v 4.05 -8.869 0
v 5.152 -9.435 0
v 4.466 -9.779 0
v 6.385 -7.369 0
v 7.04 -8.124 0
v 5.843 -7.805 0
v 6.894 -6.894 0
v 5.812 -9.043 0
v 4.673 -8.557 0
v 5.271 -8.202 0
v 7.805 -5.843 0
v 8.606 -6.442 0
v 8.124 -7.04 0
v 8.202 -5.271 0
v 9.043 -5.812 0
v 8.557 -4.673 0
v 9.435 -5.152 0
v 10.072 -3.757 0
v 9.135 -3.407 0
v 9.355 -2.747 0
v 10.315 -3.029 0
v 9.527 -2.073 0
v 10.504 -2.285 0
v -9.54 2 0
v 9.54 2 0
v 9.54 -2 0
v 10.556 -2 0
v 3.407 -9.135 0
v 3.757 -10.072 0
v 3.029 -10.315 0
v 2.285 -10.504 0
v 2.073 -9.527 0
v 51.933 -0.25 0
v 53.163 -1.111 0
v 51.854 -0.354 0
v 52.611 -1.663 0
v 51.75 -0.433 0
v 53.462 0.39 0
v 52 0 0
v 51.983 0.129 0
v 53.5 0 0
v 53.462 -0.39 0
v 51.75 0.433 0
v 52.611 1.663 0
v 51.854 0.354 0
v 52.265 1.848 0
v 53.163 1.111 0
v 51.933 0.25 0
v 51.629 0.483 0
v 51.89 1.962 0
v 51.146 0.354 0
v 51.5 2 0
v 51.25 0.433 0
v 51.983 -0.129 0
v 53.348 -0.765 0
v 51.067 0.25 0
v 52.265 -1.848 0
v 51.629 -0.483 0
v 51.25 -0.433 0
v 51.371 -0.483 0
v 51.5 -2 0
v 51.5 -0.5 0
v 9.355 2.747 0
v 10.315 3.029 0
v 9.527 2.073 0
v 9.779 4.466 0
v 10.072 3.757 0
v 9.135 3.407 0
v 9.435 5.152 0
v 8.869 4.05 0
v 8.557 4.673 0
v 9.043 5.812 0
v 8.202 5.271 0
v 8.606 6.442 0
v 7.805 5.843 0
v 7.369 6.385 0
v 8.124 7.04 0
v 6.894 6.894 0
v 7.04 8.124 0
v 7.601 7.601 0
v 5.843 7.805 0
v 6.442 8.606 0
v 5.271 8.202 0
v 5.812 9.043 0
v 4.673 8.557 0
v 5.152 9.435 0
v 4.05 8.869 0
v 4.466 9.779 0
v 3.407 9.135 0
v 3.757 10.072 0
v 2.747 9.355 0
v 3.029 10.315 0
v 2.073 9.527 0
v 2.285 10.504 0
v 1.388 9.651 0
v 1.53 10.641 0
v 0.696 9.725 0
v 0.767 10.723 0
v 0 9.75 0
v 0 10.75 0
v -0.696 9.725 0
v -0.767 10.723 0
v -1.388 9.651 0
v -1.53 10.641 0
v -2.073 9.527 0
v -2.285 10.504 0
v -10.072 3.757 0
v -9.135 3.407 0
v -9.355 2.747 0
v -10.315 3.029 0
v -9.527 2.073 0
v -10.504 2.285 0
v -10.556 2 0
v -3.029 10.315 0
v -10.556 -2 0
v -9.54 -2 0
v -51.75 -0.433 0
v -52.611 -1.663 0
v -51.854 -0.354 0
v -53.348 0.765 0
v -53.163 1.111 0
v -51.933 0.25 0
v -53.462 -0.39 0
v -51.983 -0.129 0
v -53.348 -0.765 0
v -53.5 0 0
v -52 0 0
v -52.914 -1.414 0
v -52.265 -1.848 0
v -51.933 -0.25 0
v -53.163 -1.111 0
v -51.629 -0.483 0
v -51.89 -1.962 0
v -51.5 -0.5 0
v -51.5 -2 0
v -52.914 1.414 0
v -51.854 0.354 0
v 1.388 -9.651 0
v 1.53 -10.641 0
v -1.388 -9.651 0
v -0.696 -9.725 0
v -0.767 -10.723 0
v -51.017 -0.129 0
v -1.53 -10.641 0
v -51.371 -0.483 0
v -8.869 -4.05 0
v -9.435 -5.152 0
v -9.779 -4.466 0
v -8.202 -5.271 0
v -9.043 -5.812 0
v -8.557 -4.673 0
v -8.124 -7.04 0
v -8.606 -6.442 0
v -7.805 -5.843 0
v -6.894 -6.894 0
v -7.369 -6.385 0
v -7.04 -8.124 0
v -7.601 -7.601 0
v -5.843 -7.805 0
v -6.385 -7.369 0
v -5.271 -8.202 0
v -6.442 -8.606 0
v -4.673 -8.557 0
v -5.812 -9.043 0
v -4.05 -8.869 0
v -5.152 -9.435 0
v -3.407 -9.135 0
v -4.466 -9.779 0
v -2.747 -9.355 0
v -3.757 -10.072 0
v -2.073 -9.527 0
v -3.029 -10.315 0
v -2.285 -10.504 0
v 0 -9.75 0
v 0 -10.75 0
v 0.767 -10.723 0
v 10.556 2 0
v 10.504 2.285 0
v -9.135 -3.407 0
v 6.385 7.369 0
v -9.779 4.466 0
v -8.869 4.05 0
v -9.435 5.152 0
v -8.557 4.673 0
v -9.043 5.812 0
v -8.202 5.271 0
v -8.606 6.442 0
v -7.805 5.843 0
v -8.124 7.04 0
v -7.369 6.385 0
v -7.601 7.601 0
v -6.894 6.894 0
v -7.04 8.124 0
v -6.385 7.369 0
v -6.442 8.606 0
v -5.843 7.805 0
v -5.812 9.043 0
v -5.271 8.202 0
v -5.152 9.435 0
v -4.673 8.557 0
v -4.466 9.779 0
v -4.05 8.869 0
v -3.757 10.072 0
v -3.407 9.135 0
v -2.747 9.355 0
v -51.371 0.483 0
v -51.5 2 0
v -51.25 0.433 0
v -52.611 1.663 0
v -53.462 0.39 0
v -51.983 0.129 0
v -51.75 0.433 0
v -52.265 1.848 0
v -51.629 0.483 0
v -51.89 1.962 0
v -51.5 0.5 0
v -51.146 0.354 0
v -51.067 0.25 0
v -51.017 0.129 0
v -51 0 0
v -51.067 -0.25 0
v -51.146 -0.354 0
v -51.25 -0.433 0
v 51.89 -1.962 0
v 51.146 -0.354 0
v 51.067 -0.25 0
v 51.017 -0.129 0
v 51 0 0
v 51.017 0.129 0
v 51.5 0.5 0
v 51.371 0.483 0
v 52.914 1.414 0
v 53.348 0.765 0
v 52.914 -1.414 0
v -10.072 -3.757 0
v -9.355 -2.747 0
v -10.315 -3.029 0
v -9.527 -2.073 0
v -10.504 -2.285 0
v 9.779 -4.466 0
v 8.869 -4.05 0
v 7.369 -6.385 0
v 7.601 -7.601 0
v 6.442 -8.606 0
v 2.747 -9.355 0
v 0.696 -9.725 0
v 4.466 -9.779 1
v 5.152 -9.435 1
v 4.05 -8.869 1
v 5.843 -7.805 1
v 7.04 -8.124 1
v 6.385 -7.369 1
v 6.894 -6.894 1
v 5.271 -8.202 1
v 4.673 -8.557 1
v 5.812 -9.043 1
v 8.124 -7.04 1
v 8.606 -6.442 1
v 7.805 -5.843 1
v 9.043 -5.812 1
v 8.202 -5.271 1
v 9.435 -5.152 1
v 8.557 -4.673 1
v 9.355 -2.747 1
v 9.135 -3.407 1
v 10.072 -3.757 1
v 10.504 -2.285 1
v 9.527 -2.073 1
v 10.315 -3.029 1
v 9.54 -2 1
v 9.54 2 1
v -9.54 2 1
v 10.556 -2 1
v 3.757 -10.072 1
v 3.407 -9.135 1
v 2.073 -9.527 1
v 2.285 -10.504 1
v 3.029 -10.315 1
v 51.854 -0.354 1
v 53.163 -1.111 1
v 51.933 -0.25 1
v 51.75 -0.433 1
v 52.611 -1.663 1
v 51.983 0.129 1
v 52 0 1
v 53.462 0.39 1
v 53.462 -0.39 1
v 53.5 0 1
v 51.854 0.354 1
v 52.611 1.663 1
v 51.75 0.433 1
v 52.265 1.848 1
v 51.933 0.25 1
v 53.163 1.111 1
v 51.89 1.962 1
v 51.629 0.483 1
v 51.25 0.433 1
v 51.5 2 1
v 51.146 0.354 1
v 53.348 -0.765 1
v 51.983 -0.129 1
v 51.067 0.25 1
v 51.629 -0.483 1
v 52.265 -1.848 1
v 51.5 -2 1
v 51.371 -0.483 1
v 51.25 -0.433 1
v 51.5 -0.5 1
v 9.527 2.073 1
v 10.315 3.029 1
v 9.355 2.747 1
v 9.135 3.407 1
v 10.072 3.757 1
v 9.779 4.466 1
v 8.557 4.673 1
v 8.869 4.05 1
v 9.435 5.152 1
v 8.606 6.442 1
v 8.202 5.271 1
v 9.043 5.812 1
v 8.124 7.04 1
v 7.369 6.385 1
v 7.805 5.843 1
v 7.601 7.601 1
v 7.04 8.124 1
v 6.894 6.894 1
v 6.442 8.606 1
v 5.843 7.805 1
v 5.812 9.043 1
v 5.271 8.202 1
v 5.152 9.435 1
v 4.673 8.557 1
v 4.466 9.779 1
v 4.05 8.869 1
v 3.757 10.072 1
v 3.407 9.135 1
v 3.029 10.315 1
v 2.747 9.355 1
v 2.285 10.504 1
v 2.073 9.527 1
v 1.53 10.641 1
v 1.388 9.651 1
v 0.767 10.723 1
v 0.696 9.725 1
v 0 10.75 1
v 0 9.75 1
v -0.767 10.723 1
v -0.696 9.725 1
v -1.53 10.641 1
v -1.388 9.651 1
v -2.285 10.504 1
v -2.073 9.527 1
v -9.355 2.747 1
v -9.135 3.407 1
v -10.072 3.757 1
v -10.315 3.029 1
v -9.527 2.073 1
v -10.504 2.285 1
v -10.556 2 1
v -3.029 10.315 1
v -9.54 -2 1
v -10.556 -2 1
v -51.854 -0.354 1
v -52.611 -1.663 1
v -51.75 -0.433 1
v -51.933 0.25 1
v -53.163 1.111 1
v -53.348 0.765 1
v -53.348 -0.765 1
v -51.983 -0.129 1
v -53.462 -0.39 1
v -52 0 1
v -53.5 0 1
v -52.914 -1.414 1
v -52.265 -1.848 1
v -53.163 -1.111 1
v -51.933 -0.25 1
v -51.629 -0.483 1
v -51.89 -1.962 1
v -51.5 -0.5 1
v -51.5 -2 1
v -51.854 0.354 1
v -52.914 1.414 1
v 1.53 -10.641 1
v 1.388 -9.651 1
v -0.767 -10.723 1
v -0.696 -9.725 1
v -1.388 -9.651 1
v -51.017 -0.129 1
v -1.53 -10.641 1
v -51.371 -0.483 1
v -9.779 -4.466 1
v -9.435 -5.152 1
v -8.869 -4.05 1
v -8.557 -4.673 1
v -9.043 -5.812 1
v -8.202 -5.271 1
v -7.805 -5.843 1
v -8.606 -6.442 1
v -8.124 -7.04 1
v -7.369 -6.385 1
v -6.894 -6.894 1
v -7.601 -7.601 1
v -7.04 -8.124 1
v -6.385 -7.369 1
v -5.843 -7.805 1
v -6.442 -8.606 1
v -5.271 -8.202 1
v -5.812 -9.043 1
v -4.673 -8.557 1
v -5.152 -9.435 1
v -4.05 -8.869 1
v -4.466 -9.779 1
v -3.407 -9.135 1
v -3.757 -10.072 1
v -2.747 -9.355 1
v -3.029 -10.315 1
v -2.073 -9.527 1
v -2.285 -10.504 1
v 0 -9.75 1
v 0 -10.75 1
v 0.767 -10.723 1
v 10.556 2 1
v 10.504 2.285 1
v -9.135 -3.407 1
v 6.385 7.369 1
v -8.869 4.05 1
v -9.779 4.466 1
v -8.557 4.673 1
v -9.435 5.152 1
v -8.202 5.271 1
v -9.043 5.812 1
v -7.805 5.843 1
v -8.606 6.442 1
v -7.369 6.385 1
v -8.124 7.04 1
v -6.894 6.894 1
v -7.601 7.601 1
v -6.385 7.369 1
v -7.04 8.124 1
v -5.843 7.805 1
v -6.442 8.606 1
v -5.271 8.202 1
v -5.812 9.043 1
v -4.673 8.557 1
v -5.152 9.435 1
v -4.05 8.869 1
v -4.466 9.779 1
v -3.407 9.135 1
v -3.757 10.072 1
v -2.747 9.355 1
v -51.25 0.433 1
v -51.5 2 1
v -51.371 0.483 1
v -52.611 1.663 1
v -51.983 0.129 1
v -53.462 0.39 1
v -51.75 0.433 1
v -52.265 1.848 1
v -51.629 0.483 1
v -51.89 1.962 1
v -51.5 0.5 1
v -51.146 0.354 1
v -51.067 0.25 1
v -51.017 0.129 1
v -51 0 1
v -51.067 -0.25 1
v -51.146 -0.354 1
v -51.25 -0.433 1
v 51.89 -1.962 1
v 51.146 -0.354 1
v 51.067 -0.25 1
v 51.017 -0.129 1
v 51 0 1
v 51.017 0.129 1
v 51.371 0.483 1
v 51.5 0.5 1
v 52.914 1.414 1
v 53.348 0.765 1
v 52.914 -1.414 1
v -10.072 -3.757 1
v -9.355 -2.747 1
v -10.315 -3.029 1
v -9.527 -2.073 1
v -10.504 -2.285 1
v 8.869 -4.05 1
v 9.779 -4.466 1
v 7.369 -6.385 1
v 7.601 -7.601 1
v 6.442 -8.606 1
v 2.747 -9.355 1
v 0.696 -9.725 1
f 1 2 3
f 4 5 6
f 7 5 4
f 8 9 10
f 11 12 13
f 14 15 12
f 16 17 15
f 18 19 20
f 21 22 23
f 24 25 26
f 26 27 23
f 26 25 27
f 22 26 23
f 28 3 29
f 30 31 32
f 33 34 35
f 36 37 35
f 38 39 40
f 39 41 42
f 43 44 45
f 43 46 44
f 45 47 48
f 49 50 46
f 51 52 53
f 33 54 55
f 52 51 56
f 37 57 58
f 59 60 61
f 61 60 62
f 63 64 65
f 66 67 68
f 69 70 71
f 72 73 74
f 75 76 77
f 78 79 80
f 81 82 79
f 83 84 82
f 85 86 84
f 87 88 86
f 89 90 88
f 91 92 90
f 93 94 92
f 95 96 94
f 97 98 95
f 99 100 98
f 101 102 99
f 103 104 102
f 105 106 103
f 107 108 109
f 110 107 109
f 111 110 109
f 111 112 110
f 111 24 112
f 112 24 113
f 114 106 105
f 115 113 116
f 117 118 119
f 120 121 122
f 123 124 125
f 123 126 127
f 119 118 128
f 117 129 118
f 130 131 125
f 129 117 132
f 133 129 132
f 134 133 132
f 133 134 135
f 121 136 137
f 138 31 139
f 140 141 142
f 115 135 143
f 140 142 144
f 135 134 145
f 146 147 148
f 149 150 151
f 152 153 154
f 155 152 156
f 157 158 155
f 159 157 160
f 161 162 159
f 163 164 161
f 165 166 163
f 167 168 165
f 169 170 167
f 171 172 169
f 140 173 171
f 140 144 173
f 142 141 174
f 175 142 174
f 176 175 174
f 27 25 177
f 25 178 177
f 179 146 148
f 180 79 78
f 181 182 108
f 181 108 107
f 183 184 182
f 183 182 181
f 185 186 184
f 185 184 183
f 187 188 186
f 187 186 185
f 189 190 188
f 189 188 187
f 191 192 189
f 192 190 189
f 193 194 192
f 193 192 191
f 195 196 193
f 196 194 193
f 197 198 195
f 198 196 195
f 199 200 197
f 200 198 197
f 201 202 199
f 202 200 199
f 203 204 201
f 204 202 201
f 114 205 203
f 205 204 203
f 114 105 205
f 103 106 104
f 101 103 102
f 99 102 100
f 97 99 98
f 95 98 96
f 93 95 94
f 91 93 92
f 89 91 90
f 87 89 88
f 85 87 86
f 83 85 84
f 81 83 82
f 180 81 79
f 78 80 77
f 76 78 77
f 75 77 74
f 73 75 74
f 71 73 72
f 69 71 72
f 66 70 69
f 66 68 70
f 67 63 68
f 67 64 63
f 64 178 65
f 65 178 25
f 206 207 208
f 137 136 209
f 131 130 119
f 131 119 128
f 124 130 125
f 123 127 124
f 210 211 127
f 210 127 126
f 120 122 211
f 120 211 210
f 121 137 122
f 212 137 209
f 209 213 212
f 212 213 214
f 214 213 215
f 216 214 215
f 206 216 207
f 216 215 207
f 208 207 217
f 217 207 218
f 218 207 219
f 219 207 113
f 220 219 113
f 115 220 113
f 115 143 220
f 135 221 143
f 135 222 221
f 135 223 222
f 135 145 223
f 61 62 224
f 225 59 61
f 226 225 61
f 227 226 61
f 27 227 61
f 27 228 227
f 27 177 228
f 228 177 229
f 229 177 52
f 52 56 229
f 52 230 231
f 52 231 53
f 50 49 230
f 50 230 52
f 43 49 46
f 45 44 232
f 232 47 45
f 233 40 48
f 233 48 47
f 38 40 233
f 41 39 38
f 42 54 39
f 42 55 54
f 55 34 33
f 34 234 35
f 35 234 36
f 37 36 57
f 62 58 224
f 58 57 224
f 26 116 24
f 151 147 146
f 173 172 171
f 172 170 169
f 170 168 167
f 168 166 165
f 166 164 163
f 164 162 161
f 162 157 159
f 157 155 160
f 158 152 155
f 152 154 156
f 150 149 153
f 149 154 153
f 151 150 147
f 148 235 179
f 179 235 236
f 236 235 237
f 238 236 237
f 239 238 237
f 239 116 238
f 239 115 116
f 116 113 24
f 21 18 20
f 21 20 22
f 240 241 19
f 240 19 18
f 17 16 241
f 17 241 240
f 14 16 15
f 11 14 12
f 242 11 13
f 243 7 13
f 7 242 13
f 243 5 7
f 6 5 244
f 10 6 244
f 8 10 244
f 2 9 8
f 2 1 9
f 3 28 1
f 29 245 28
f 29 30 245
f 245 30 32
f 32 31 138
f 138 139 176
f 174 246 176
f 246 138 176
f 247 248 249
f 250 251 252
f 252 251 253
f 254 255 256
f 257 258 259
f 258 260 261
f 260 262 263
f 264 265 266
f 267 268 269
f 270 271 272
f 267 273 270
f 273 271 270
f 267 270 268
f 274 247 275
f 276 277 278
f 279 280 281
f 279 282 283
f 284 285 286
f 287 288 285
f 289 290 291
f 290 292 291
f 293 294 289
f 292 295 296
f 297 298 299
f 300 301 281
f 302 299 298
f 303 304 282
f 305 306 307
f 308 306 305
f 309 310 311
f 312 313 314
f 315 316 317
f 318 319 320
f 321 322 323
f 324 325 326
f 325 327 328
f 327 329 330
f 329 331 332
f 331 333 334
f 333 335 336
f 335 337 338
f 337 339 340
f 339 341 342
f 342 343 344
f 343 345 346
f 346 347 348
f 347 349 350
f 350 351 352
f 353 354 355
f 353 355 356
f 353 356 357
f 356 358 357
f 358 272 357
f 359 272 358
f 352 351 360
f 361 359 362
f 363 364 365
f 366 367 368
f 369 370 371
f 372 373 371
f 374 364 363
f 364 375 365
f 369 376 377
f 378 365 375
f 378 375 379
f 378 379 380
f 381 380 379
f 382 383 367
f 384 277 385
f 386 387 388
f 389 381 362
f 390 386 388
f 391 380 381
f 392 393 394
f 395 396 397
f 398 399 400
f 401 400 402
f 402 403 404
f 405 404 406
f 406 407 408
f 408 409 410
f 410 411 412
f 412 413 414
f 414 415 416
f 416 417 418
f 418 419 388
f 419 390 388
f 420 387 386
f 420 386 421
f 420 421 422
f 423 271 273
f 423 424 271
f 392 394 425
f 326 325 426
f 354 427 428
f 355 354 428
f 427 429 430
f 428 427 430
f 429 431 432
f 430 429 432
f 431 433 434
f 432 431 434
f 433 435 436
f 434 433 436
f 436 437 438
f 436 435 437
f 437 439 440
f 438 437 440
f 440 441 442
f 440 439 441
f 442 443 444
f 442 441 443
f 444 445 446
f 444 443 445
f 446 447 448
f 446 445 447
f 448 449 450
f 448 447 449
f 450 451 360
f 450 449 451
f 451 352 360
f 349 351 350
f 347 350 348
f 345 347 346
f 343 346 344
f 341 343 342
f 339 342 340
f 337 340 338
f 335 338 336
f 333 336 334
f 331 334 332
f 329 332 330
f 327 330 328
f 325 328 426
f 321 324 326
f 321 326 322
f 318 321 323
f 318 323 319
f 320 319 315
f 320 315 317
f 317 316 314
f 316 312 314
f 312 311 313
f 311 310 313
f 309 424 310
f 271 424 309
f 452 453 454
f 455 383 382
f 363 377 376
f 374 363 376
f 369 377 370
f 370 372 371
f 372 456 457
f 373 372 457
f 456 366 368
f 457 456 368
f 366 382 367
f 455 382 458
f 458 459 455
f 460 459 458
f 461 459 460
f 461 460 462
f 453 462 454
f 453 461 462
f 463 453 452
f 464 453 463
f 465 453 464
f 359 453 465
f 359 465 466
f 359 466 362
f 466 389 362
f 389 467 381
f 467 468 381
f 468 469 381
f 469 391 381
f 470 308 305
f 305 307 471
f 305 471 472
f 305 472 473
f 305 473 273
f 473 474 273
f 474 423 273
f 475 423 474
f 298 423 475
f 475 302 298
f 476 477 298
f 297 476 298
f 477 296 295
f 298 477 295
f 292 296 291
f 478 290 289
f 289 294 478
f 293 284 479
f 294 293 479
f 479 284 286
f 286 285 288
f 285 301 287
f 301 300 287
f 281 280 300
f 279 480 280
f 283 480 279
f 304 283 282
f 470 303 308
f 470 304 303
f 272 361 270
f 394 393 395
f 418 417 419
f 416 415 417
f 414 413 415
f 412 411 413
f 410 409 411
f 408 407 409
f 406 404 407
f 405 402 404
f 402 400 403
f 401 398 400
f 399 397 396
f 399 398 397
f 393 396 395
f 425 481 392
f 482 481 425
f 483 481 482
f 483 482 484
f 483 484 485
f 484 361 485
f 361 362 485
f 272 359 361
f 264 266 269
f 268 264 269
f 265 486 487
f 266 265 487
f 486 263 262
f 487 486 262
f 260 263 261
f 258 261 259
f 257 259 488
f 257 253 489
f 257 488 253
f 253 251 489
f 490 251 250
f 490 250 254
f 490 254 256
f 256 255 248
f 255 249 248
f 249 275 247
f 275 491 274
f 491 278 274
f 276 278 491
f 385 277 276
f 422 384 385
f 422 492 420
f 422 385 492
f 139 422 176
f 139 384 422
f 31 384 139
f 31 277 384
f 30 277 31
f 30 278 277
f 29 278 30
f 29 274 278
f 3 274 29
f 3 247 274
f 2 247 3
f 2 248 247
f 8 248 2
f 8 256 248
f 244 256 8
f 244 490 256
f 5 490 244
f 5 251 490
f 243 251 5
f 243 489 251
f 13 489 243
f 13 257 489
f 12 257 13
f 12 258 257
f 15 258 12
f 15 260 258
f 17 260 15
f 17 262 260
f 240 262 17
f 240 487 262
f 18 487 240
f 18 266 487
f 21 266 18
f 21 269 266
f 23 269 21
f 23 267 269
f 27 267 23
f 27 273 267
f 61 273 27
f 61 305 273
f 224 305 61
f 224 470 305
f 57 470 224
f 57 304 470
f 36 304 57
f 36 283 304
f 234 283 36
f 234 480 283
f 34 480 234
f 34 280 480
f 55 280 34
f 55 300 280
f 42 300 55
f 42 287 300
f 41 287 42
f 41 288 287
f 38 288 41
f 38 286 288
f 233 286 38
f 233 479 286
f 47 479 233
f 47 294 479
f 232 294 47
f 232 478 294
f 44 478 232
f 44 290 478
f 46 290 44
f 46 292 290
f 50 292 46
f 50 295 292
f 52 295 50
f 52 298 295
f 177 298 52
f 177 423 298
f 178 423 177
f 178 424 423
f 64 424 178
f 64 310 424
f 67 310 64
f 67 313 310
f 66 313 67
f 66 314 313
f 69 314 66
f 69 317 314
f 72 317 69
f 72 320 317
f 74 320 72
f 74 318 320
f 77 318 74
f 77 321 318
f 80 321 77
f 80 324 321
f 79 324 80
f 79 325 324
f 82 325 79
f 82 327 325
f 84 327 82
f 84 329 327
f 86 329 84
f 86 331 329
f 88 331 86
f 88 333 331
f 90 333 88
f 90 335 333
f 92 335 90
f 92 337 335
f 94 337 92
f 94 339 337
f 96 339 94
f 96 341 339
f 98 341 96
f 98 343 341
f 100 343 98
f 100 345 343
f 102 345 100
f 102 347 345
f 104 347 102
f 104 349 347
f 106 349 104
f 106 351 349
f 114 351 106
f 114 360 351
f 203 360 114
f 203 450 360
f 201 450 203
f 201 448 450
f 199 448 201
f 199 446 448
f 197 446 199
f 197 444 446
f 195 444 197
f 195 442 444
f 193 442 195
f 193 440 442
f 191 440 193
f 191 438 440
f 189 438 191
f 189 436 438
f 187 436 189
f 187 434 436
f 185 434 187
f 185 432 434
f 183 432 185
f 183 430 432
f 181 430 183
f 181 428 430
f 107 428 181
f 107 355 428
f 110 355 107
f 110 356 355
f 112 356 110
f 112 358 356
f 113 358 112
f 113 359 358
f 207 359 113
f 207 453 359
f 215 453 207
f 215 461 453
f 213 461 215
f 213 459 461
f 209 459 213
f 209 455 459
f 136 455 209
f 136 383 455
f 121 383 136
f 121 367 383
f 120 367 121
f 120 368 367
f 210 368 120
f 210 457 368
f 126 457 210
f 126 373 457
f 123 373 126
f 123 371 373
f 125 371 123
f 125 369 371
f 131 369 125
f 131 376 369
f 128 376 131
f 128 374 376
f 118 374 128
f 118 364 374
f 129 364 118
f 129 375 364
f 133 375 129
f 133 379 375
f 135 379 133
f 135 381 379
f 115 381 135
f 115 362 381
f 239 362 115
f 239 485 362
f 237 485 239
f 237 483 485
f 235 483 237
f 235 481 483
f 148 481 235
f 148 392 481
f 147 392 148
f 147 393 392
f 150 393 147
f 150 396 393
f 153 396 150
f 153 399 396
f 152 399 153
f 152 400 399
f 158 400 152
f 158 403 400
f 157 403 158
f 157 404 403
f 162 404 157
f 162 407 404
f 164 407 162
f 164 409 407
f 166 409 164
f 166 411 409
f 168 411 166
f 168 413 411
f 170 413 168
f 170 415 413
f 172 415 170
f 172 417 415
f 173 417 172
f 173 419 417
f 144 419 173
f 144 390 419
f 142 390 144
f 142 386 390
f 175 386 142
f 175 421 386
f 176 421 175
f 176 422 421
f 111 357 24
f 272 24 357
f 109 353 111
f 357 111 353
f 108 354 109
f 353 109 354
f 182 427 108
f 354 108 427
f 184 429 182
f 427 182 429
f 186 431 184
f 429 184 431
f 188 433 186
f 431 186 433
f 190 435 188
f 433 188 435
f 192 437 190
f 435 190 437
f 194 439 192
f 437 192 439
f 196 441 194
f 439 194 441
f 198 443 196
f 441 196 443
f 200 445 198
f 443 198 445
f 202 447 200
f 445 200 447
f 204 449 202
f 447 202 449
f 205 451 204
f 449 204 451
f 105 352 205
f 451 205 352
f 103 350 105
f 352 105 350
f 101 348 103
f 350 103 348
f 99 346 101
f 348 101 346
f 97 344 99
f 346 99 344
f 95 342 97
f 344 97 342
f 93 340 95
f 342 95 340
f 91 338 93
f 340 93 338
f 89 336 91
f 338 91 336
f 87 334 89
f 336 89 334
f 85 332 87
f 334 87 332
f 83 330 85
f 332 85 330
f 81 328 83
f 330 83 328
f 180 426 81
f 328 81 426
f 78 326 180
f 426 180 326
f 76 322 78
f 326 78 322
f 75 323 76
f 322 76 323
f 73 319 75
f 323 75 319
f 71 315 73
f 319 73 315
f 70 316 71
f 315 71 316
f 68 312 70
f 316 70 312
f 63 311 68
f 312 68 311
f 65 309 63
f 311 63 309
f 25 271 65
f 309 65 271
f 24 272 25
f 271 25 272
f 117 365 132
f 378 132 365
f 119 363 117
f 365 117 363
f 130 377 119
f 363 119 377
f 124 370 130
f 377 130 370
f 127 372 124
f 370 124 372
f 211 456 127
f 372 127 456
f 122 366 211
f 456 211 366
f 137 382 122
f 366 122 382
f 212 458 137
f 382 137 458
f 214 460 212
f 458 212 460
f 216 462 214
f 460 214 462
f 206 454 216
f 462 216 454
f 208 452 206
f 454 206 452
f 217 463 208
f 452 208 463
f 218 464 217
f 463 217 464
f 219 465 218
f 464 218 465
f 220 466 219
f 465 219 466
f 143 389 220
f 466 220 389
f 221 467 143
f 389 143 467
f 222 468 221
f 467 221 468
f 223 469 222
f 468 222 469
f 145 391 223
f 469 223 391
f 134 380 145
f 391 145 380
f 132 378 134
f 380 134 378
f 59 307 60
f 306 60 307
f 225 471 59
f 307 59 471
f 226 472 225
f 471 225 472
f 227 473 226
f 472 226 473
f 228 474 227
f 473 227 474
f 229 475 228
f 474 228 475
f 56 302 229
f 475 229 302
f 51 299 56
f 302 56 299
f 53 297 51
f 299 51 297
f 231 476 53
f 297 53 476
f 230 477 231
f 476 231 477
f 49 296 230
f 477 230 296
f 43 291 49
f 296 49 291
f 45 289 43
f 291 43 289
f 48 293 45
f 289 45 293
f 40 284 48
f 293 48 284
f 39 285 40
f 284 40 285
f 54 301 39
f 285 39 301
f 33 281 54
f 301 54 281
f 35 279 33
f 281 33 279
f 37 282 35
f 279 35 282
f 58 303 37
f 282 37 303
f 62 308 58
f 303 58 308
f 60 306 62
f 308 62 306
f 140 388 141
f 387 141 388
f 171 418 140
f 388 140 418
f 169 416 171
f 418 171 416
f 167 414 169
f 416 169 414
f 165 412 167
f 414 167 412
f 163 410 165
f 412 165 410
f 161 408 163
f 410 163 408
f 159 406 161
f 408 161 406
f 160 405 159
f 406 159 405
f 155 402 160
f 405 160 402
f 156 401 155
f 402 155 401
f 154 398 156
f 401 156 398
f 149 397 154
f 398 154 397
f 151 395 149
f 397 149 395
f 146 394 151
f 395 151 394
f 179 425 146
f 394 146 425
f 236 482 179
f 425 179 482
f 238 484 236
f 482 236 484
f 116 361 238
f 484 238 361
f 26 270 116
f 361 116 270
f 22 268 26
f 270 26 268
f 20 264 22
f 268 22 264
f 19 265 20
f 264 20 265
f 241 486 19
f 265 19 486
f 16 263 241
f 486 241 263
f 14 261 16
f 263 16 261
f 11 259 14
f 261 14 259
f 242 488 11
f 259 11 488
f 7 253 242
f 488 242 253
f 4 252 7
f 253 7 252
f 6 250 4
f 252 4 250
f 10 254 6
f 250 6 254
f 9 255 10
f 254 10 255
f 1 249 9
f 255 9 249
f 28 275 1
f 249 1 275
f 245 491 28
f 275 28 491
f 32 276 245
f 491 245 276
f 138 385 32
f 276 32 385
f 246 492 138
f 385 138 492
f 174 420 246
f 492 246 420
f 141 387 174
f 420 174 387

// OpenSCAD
// part_id: jup13
// name: Jupiter pointer arm
// source_drawing_ids: DRW-012
// units: mm
// revision: 0.1
// SPDX-License-Identifier: MIT

module jup13_profile_2d(
    arm_len = 51.5,
    arm_w = 4.0,
    hub_od = 21.5,
    hub_id = 19.5,
    end_hole_d = 1.0
) {
    difference() {
        union() {
            hull() {
                translate([-arm_len, 0]) circle(d = arm_w, $fn = 32);
                circle(d = arm_w, $fn = 32);
            }
            hull() {
                translate([arm_len, 0]) circle(d = arm_w, $fn = 32);
                circle(d = arm_w, $fn = 32);
            }
            difference() {
                circle(d = hub_od, $fn = 88);
                circle(d = hub_id, $fn = 88);
            }
        }
        translate([-arm_len, 0]) circle(d = end_hole_d, $fn = 24);
        translate([arm_len, 0]) circle(d = end_hole_d, $fn = 24);
    }
}

module part_jup13(thickness = 1.0) {
    linear_extrude(height = thickness) jup13_profile_2d();
}

// ---- "main guard" ----
// Default to previewing when opened directly:
if (is_undef(__LIB_MODE__)) {
    part_jup13();
}
